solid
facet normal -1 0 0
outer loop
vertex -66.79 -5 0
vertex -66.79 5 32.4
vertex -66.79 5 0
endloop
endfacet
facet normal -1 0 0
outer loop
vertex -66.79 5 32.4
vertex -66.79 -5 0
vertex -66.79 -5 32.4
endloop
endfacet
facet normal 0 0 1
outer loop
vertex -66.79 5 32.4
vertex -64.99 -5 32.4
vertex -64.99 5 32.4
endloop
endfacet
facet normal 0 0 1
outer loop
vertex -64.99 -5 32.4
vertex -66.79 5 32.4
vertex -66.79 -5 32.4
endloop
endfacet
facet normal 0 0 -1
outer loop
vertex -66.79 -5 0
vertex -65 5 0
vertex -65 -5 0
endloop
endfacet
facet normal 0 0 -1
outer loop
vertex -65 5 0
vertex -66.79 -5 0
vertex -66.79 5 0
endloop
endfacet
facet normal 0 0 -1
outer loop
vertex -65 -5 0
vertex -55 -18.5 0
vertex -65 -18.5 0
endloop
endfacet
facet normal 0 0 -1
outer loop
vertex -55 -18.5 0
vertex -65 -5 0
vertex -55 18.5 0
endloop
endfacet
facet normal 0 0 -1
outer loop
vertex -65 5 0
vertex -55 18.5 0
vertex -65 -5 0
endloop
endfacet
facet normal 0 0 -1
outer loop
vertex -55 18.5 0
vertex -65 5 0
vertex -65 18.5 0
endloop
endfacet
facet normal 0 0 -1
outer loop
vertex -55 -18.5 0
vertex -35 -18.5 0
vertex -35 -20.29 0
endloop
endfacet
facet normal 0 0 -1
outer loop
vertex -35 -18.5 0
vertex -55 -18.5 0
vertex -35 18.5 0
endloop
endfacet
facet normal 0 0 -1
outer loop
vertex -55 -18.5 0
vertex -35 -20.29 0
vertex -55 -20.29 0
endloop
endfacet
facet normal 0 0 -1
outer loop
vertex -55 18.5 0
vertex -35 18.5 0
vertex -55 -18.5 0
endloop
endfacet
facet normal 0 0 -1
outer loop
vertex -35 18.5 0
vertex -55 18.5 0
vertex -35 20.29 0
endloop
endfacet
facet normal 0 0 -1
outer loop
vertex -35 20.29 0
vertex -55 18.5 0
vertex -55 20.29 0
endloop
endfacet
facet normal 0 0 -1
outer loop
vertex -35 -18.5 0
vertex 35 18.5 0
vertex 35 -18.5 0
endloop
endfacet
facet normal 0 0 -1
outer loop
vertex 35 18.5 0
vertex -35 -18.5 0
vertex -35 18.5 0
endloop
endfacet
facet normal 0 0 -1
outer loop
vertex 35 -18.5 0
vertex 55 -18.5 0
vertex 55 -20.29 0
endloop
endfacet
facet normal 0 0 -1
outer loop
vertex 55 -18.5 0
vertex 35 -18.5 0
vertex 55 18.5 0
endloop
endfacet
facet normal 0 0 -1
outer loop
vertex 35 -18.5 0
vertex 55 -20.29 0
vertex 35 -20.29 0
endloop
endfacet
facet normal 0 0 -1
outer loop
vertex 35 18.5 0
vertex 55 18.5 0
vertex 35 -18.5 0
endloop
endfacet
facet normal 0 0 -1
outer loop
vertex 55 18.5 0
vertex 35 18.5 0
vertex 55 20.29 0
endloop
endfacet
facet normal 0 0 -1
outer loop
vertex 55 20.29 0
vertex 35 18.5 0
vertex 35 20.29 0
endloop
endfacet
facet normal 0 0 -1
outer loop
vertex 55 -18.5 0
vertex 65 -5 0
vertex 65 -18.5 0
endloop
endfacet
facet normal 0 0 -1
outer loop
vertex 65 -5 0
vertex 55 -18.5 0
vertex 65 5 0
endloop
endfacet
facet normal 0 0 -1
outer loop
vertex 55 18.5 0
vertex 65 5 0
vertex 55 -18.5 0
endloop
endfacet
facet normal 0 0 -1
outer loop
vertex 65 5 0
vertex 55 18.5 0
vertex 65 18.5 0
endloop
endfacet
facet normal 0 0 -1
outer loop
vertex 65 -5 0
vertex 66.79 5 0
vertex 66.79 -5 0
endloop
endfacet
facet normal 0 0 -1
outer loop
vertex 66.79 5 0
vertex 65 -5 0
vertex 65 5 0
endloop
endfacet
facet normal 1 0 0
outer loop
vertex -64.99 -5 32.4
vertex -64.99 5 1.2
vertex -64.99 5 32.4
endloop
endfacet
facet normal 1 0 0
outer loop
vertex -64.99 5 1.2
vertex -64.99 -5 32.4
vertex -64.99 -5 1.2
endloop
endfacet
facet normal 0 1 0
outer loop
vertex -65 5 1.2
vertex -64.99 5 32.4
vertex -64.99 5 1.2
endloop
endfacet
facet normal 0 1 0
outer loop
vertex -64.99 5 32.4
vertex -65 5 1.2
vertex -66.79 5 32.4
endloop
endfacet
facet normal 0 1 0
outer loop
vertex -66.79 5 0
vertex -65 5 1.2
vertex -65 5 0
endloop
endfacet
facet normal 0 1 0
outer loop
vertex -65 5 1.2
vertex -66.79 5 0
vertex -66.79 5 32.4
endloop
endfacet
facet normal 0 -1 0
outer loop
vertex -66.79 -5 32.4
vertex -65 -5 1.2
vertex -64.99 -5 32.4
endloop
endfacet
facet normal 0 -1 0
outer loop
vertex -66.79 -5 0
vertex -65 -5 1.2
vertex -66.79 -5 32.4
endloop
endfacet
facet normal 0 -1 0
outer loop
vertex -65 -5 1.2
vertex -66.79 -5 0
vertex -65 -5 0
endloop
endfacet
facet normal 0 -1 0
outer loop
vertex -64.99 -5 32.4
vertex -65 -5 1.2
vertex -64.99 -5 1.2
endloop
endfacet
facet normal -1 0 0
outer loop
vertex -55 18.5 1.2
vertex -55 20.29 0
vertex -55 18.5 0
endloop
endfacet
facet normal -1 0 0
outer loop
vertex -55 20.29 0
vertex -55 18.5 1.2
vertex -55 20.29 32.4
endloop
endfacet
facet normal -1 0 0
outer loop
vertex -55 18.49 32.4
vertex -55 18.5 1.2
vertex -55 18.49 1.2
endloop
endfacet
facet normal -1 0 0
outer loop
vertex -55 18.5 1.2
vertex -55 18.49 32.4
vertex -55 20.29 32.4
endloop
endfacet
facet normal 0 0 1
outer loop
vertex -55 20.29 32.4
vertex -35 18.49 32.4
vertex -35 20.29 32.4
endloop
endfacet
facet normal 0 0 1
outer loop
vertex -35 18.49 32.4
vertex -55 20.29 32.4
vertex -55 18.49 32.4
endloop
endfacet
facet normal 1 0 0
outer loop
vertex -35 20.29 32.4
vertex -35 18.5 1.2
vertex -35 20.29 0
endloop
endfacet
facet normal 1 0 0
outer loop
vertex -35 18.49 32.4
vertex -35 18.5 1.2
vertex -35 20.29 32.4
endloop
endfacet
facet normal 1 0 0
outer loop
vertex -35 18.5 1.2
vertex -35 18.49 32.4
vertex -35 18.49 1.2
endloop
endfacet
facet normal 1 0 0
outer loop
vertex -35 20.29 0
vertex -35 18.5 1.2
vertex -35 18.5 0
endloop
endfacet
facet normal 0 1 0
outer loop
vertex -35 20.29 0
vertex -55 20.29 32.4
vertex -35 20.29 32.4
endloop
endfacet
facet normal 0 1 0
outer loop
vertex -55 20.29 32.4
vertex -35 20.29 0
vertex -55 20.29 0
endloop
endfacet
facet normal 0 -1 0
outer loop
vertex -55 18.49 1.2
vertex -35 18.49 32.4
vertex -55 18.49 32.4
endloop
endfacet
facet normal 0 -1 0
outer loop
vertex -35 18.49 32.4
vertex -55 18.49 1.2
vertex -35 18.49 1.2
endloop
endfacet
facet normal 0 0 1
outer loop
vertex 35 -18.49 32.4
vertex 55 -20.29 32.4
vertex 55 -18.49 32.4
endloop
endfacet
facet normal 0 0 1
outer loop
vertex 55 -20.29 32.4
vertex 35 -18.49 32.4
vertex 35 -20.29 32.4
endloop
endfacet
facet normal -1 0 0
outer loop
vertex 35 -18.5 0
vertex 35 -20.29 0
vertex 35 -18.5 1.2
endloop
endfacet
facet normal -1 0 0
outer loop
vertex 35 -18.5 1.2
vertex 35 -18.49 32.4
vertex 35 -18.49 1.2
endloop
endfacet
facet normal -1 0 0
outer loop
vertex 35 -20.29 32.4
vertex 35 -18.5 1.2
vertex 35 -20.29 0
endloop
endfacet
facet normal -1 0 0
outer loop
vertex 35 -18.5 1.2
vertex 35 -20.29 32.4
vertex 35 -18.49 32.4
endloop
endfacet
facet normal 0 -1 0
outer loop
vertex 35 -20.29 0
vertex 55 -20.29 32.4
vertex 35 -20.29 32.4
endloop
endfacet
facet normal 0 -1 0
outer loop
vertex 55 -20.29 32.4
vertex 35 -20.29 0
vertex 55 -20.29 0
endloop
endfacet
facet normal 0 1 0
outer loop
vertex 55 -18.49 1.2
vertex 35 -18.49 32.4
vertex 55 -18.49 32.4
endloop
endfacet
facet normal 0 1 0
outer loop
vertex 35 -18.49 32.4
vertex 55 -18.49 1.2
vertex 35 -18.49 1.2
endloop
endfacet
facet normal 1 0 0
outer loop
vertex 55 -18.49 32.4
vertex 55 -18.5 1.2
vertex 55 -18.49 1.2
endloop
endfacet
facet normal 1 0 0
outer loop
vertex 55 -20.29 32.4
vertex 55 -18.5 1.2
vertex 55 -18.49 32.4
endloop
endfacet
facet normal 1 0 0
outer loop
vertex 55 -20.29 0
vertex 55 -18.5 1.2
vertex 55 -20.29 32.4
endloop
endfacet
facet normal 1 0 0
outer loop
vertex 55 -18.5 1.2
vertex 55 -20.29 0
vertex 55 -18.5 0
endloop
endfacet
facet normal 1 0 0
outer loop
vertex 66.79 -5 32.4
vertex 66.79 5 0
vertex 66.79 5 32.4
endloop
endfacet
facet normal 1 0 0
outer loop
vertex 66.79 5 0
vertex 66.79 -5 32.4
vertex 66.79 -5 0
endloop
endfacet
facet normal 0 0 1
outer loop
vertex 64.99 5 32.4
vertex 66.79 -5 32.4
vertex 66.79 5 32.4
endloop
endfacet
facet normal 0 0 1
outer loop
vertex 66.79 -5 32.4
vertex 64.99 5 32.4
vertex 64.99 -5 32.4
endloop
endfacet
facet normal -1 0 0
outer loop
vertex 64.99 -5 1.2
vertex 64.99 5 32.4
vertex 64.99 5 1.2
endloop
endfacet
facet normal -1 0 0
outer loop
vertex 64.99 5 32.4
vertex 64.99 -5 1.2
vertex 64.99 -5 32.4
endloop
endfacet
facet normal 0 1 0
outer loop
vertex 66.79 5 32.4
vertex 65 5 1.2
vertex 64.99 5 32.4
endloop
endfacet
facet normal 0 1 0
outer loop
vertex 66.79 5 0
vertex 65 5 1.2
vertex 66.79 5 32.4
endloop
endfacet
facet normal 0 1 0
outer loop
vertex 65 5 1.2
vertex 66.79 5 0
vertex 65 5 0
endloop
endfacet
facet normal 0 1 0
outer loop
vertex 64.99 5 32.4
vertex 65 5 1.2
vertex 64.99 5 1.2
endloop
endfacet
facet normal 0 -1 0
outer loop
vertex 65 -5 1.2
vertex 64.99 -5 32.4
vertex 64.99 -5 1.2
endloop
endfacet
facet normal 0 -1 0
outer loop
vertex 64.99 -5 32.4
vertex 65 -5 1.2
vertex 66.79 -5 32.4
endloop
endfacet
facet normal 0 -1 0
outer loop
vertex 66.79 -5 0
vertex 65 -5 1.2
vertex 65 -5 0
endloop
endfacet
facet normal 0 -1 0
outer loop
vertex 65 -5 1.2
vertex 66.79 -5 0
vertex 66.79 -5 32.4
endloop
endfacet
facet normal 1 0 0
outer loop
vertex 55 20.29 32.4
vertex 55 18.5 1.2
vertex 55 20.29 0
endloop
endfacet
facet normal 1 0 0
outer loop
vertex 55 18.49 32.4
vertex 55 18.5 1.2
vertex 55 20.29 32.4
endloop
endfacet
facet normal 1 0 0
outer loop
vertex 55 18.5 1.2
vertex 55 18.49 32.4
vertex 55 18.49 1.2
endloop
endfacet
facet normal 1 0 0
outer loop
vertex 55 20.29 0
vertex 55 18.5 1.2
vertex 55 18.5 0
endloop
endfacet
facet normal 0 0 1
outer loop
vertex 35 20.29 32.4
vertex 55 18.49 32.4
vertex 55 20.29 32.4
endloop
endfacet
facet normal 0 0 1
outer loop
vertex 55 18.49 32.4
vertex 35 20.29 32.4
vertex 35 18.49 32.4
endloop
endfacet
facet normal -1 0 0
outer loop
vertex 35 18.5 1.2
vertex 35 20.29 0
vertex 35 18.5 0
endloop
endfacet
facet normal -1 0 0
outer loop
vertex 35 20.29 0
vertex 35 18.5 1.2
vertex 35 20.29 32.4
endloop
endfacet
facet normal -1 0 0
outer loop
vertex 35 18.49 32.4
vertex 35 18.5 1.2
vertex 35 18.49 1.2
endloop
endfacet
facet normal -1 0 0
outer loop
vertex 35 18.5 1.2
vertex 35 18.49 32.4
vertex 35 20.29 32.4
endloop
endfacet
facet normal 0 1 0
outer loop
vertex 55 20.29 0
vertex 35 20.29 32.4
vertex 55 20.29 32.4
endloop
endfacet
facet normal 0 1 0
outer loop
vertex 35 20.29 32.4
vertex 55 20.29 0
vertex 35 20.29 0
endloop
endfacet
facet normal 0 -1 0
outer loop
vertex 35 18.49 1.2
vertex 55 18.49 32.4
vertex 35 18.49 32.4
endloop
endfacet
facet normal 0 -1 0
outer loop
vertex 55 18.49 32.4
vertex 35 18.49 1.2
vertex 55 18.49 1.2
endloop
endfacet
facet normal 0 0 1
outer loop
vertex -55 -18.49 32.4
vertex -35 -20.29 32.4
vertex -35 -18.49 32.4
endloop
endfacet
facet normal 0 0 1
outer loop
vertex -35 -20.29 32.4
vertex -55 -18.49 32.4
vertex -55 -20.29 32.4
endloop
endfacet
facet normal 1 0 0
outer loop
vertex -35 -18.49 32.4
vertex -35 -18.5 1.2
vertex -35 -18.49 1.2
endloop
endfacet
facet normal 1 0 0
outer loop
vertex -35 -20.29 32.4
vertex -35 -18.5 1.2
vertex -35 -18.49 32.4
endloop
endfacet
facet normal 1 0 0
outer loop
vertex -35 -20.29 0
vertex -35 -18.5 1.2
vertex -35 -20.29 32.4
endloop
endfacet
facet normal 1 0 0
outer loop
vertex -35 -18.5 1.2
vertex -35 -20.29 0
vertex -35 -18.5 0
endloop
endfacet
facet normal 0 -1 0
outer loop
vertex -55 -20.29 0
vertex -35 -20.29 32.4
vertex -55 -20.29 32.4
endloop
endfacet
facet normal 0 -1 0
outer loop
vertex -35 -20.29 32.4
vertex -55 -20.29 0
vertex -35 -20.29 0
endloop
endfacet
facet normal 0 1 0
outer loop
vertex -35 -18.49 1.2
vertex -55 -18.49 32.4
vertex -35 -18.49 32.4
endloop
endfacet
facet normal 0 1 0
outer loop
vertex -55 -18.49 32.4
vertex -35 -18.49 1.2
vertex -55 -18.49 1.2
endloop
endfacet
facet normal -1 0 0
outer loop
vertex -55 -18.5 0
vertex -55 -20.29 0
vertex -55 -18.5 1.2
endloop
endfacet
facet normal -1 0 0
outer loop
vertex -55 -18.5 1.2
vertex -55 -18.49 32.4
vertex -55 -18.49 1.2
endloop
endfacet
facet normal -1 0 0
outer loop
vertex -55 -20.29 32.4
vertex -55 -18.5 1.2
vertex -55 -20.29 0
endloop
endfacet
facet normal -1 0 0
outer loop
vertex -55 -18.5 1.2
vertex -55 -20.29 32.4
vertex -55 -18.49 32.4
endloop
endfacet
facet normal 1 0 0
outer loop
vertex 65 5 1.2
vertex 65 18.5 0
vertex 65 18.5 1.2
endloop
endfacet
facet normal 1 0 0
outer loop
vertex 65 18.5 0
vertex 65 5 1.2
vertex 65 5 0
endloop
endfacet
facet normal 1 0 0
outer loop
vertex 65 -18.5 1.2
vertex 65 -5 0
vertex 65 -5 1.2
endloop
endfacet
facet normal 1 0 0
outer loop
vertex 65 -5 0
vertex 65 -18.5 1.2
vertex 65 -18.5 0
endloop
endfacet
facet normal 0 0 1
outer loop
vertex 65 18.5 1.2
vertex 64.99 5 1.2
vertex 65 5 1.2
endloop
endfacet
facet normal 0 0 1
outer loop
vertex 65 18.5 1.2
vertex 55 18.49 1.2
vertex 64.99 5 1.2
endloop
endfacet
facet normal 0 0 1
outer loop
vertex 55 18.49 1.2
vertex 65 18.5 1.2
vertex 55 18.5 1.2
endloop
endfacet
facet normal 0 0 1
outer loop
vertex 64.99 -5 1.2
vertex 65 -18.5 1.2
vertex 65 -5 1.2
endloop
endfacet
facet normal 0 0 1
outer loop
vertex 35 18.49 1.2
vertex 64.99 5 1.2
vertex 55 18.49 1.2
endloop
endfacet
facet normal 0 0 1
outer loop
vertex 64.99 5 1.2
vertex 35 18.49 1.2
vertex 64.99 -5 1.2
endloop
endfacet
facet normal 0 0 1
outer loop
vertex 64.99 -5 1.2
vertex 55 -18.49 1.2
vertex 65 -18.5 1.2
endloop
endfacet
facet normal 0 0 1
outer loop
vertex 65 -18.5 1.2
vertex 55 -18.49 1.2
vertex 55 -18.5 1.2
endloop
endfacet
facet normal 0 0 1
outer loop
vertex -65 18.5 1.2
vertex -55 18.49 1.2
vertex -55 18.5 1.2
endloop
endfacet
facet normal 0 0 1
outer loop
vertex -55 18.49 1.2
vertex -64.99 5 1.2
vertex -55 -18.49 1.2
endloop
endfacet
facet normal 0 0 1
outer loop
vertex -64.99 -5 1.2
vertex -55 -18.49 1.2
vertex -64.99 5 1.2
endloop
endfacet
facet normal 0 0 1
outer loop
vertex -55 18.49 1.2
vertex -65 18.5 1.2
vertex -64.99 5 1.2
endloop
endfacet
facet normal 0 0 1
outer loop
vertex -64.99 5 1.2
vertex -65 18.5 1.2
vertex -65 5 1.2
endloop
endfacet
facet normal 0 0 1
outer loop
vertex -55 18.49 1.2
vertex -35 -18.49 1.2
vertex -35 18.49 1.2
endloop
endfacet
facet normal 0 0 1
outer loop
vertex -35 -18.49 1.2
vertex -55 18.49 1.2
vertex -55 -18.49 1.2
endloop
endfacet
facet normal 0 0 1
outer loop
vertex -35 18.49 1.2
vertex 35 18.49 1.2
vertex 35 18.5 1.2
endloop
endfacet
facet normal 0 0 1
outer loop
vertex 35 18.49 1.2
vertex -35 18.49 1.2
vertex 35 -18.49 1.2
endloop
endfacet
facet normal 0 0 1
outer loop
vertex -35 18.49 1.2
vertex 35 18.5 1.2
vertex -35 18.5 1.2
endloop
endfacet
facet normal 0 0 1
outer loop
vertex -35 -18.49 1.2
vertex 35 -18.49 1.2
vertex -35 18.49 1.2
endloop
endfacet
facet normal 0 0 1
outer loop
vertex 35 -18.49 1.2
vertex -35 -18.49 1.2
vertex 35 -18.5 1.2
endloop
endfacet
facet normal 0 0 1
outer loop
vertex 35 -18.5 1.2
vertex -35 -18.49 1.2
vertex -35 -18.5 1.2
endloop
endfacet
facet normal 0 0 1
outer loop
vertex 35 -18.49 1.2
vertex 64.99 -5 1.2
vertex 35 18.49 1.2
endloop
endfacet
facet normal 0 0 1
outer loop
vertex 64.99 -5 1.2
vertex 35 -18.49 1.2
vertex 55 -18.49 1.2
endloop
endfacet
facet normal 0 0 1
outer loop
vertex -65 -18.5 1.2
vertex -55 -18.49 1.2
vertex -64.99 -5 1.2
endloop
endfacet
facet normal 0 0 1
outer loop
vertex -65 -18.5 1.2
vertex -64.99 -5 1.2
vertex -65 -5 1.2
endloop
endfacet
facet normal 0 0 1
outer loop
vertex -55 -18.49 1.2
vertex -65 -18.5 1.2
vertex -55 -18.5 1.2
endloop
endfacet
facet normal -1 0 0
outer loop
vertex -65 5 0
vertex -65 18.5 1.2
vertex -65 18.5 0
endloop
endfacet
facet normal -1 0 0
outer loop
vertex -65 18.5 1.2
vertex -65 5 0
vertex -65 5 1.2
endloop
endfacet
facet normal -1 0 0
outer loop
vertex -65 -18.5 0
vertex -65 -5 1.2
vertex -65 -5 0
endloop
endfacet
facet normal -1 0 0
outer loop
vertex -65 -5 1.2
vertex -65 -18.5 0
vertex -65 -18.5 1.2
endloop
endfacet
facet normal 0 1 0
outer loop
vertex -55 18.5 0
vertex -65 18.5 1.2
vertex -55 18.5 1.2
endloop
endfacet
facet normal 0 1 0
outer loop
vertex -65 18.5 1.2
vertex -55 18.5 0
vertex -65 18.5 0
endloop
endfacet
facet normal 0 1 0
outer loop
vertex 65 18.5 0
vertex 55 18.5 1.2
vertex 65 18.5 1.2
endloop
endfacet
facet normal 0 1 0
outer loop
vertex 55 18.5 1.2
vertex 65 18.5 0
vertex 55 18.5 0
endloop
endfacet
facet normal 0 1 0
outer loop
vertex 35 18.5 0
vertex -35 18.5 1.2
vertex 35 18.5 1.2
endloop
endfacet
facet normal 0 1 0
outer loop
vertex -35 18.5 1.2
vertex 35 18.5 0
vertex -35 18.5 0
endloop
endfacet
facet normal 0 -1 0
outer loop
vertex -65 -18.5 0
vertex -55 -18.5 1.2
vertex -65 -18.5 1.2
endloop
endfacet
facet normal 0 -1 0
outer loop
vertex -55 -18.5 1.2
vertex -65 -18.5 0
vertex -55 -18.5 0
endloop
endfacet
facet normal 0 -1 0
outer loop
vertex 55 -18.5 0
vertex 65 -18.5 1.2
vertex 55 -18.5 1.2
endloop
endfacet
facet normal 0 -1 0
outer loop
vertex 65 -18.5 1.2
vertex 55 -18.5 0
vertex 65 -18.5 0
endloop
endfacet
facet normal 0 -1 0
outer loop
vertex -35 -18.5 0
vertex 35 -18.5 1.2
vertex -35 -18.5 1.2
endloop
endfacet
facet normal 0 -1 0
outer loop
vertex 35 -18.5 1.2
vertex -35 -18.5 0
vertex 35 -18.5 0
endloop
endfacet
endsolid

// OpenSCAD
// -*- mode: SCAD ; c-file-style: "ellemtel" ; coding: utf-8 -*-
//
// correctly sized simple shape to stack four picture 135 type film strips
//
// © 2018 Roland Sieker <ospalh@gmail.com>
// Licence: CC-BY-SA 4.0


// … to preview. You will get all parts when you click “Create Thing”.
part = "stack"; // [stack: Stapler, lid: Deckel]

// Set this to “render” and click on “Create Thing” when done with the setup.
preview = 1; // [0:render, 1:preview]
// not needed

ex = 3;
ey = 2;
lld = 127;  // Pitch scheint 1¼ Zoll zu sein, → Vier Bilder ergibt fünf Zoll.
ll = lld + ex;

wld = 35; // Make it fit between the plates without problems
wst = wld + ey; // 35 mm + clearance
h = 30; // I have a lot of film strips i want to stack
epl = 10;
spl = 20;
spo = 10;

/* [Hidden] */

// Done with the customizer

// *******************************************************
// Extra parameters. These can be changed reasonably safely.


w = 1.8;  // Wall width
p = 1.2;  // Bottom, top plate height
c = 0.4;  // Clearance
angle = 60; // Overhangs much below 60° are a problem for me

// *******************************************************
// Some shortcuts. These shouldn’t be changed

tau = 2 * PI;  // π is still wrong. τ = ⌀ ÷ r

xy_factor = 1/tan(angle);
// To get from a height to a horizontal width inclined correctly
z_factor = tan(angle);  // The other way around

he = h + 2*p;
spo2 = ll/2 - spo - spl;

some_distance = 50;
ms = 0.01;  // Muggeseggele.

// fn for differently sized objects and fs, fa; all for preview or rendering.
pna = 40;
pnb = 15;
pa = 5;
ps = 1;
rna = 180;
rnb = 30;
ra = 1;
rs = 0.1;
function na() = (preview) ? pna : rna;
function nb() = (preview) ? pnb : rnb;
$fs = (preview) ? ps : rs;
$fa = (preview) ? pa : ra;

// *******************************************************
// End setup



// *******************************************************
// Generate the parts

print_part();
// preview_parts();
// stack_parts();



module print_part()
{
   if ("stack" == part)
   {
      stack();
   }
   if ("lid" == part)
   {
      lid();
   }
}

module preview_parts()
{
   stack();
   translate([0, some_distance, 0])
   {
      lid();
   }
}

module stack_parts()
{
   // intersection()
   {
      color("yellow")
      {
         stack();
      }
      translate([0,0, 3*p])
      {
         color("red")
         {
            lid();
         }
      }
   }
}

// *******************************************************
// Code for the parts themselves

module stack()
{
   translate([0,0,p/2])
   {
      cube([ll, wst, p], center=true);
   }
   plates();
}


module lid()
{
   translate([0,0,p/2])
   {
      cube([lld, wld, p], center=true);
   }
}


module plates()
{
   end_plate();
   side_plate();
   rotate(180)
   {
      side_plate();
   }
   mirror()
   {
      end_plate();
      side_plate();
      rotate(180)
      {
         side_plate();
      }
   }
}

module end_plate()
{
   translate([ll/2-ms , -epl/2,0])
   {
      cube([w, epl, he]);
   }
}

module side_plate()
{
   translate([spo2, wst/2-ms,0])
   {
      cube([spl, w, he]);
   }
}
